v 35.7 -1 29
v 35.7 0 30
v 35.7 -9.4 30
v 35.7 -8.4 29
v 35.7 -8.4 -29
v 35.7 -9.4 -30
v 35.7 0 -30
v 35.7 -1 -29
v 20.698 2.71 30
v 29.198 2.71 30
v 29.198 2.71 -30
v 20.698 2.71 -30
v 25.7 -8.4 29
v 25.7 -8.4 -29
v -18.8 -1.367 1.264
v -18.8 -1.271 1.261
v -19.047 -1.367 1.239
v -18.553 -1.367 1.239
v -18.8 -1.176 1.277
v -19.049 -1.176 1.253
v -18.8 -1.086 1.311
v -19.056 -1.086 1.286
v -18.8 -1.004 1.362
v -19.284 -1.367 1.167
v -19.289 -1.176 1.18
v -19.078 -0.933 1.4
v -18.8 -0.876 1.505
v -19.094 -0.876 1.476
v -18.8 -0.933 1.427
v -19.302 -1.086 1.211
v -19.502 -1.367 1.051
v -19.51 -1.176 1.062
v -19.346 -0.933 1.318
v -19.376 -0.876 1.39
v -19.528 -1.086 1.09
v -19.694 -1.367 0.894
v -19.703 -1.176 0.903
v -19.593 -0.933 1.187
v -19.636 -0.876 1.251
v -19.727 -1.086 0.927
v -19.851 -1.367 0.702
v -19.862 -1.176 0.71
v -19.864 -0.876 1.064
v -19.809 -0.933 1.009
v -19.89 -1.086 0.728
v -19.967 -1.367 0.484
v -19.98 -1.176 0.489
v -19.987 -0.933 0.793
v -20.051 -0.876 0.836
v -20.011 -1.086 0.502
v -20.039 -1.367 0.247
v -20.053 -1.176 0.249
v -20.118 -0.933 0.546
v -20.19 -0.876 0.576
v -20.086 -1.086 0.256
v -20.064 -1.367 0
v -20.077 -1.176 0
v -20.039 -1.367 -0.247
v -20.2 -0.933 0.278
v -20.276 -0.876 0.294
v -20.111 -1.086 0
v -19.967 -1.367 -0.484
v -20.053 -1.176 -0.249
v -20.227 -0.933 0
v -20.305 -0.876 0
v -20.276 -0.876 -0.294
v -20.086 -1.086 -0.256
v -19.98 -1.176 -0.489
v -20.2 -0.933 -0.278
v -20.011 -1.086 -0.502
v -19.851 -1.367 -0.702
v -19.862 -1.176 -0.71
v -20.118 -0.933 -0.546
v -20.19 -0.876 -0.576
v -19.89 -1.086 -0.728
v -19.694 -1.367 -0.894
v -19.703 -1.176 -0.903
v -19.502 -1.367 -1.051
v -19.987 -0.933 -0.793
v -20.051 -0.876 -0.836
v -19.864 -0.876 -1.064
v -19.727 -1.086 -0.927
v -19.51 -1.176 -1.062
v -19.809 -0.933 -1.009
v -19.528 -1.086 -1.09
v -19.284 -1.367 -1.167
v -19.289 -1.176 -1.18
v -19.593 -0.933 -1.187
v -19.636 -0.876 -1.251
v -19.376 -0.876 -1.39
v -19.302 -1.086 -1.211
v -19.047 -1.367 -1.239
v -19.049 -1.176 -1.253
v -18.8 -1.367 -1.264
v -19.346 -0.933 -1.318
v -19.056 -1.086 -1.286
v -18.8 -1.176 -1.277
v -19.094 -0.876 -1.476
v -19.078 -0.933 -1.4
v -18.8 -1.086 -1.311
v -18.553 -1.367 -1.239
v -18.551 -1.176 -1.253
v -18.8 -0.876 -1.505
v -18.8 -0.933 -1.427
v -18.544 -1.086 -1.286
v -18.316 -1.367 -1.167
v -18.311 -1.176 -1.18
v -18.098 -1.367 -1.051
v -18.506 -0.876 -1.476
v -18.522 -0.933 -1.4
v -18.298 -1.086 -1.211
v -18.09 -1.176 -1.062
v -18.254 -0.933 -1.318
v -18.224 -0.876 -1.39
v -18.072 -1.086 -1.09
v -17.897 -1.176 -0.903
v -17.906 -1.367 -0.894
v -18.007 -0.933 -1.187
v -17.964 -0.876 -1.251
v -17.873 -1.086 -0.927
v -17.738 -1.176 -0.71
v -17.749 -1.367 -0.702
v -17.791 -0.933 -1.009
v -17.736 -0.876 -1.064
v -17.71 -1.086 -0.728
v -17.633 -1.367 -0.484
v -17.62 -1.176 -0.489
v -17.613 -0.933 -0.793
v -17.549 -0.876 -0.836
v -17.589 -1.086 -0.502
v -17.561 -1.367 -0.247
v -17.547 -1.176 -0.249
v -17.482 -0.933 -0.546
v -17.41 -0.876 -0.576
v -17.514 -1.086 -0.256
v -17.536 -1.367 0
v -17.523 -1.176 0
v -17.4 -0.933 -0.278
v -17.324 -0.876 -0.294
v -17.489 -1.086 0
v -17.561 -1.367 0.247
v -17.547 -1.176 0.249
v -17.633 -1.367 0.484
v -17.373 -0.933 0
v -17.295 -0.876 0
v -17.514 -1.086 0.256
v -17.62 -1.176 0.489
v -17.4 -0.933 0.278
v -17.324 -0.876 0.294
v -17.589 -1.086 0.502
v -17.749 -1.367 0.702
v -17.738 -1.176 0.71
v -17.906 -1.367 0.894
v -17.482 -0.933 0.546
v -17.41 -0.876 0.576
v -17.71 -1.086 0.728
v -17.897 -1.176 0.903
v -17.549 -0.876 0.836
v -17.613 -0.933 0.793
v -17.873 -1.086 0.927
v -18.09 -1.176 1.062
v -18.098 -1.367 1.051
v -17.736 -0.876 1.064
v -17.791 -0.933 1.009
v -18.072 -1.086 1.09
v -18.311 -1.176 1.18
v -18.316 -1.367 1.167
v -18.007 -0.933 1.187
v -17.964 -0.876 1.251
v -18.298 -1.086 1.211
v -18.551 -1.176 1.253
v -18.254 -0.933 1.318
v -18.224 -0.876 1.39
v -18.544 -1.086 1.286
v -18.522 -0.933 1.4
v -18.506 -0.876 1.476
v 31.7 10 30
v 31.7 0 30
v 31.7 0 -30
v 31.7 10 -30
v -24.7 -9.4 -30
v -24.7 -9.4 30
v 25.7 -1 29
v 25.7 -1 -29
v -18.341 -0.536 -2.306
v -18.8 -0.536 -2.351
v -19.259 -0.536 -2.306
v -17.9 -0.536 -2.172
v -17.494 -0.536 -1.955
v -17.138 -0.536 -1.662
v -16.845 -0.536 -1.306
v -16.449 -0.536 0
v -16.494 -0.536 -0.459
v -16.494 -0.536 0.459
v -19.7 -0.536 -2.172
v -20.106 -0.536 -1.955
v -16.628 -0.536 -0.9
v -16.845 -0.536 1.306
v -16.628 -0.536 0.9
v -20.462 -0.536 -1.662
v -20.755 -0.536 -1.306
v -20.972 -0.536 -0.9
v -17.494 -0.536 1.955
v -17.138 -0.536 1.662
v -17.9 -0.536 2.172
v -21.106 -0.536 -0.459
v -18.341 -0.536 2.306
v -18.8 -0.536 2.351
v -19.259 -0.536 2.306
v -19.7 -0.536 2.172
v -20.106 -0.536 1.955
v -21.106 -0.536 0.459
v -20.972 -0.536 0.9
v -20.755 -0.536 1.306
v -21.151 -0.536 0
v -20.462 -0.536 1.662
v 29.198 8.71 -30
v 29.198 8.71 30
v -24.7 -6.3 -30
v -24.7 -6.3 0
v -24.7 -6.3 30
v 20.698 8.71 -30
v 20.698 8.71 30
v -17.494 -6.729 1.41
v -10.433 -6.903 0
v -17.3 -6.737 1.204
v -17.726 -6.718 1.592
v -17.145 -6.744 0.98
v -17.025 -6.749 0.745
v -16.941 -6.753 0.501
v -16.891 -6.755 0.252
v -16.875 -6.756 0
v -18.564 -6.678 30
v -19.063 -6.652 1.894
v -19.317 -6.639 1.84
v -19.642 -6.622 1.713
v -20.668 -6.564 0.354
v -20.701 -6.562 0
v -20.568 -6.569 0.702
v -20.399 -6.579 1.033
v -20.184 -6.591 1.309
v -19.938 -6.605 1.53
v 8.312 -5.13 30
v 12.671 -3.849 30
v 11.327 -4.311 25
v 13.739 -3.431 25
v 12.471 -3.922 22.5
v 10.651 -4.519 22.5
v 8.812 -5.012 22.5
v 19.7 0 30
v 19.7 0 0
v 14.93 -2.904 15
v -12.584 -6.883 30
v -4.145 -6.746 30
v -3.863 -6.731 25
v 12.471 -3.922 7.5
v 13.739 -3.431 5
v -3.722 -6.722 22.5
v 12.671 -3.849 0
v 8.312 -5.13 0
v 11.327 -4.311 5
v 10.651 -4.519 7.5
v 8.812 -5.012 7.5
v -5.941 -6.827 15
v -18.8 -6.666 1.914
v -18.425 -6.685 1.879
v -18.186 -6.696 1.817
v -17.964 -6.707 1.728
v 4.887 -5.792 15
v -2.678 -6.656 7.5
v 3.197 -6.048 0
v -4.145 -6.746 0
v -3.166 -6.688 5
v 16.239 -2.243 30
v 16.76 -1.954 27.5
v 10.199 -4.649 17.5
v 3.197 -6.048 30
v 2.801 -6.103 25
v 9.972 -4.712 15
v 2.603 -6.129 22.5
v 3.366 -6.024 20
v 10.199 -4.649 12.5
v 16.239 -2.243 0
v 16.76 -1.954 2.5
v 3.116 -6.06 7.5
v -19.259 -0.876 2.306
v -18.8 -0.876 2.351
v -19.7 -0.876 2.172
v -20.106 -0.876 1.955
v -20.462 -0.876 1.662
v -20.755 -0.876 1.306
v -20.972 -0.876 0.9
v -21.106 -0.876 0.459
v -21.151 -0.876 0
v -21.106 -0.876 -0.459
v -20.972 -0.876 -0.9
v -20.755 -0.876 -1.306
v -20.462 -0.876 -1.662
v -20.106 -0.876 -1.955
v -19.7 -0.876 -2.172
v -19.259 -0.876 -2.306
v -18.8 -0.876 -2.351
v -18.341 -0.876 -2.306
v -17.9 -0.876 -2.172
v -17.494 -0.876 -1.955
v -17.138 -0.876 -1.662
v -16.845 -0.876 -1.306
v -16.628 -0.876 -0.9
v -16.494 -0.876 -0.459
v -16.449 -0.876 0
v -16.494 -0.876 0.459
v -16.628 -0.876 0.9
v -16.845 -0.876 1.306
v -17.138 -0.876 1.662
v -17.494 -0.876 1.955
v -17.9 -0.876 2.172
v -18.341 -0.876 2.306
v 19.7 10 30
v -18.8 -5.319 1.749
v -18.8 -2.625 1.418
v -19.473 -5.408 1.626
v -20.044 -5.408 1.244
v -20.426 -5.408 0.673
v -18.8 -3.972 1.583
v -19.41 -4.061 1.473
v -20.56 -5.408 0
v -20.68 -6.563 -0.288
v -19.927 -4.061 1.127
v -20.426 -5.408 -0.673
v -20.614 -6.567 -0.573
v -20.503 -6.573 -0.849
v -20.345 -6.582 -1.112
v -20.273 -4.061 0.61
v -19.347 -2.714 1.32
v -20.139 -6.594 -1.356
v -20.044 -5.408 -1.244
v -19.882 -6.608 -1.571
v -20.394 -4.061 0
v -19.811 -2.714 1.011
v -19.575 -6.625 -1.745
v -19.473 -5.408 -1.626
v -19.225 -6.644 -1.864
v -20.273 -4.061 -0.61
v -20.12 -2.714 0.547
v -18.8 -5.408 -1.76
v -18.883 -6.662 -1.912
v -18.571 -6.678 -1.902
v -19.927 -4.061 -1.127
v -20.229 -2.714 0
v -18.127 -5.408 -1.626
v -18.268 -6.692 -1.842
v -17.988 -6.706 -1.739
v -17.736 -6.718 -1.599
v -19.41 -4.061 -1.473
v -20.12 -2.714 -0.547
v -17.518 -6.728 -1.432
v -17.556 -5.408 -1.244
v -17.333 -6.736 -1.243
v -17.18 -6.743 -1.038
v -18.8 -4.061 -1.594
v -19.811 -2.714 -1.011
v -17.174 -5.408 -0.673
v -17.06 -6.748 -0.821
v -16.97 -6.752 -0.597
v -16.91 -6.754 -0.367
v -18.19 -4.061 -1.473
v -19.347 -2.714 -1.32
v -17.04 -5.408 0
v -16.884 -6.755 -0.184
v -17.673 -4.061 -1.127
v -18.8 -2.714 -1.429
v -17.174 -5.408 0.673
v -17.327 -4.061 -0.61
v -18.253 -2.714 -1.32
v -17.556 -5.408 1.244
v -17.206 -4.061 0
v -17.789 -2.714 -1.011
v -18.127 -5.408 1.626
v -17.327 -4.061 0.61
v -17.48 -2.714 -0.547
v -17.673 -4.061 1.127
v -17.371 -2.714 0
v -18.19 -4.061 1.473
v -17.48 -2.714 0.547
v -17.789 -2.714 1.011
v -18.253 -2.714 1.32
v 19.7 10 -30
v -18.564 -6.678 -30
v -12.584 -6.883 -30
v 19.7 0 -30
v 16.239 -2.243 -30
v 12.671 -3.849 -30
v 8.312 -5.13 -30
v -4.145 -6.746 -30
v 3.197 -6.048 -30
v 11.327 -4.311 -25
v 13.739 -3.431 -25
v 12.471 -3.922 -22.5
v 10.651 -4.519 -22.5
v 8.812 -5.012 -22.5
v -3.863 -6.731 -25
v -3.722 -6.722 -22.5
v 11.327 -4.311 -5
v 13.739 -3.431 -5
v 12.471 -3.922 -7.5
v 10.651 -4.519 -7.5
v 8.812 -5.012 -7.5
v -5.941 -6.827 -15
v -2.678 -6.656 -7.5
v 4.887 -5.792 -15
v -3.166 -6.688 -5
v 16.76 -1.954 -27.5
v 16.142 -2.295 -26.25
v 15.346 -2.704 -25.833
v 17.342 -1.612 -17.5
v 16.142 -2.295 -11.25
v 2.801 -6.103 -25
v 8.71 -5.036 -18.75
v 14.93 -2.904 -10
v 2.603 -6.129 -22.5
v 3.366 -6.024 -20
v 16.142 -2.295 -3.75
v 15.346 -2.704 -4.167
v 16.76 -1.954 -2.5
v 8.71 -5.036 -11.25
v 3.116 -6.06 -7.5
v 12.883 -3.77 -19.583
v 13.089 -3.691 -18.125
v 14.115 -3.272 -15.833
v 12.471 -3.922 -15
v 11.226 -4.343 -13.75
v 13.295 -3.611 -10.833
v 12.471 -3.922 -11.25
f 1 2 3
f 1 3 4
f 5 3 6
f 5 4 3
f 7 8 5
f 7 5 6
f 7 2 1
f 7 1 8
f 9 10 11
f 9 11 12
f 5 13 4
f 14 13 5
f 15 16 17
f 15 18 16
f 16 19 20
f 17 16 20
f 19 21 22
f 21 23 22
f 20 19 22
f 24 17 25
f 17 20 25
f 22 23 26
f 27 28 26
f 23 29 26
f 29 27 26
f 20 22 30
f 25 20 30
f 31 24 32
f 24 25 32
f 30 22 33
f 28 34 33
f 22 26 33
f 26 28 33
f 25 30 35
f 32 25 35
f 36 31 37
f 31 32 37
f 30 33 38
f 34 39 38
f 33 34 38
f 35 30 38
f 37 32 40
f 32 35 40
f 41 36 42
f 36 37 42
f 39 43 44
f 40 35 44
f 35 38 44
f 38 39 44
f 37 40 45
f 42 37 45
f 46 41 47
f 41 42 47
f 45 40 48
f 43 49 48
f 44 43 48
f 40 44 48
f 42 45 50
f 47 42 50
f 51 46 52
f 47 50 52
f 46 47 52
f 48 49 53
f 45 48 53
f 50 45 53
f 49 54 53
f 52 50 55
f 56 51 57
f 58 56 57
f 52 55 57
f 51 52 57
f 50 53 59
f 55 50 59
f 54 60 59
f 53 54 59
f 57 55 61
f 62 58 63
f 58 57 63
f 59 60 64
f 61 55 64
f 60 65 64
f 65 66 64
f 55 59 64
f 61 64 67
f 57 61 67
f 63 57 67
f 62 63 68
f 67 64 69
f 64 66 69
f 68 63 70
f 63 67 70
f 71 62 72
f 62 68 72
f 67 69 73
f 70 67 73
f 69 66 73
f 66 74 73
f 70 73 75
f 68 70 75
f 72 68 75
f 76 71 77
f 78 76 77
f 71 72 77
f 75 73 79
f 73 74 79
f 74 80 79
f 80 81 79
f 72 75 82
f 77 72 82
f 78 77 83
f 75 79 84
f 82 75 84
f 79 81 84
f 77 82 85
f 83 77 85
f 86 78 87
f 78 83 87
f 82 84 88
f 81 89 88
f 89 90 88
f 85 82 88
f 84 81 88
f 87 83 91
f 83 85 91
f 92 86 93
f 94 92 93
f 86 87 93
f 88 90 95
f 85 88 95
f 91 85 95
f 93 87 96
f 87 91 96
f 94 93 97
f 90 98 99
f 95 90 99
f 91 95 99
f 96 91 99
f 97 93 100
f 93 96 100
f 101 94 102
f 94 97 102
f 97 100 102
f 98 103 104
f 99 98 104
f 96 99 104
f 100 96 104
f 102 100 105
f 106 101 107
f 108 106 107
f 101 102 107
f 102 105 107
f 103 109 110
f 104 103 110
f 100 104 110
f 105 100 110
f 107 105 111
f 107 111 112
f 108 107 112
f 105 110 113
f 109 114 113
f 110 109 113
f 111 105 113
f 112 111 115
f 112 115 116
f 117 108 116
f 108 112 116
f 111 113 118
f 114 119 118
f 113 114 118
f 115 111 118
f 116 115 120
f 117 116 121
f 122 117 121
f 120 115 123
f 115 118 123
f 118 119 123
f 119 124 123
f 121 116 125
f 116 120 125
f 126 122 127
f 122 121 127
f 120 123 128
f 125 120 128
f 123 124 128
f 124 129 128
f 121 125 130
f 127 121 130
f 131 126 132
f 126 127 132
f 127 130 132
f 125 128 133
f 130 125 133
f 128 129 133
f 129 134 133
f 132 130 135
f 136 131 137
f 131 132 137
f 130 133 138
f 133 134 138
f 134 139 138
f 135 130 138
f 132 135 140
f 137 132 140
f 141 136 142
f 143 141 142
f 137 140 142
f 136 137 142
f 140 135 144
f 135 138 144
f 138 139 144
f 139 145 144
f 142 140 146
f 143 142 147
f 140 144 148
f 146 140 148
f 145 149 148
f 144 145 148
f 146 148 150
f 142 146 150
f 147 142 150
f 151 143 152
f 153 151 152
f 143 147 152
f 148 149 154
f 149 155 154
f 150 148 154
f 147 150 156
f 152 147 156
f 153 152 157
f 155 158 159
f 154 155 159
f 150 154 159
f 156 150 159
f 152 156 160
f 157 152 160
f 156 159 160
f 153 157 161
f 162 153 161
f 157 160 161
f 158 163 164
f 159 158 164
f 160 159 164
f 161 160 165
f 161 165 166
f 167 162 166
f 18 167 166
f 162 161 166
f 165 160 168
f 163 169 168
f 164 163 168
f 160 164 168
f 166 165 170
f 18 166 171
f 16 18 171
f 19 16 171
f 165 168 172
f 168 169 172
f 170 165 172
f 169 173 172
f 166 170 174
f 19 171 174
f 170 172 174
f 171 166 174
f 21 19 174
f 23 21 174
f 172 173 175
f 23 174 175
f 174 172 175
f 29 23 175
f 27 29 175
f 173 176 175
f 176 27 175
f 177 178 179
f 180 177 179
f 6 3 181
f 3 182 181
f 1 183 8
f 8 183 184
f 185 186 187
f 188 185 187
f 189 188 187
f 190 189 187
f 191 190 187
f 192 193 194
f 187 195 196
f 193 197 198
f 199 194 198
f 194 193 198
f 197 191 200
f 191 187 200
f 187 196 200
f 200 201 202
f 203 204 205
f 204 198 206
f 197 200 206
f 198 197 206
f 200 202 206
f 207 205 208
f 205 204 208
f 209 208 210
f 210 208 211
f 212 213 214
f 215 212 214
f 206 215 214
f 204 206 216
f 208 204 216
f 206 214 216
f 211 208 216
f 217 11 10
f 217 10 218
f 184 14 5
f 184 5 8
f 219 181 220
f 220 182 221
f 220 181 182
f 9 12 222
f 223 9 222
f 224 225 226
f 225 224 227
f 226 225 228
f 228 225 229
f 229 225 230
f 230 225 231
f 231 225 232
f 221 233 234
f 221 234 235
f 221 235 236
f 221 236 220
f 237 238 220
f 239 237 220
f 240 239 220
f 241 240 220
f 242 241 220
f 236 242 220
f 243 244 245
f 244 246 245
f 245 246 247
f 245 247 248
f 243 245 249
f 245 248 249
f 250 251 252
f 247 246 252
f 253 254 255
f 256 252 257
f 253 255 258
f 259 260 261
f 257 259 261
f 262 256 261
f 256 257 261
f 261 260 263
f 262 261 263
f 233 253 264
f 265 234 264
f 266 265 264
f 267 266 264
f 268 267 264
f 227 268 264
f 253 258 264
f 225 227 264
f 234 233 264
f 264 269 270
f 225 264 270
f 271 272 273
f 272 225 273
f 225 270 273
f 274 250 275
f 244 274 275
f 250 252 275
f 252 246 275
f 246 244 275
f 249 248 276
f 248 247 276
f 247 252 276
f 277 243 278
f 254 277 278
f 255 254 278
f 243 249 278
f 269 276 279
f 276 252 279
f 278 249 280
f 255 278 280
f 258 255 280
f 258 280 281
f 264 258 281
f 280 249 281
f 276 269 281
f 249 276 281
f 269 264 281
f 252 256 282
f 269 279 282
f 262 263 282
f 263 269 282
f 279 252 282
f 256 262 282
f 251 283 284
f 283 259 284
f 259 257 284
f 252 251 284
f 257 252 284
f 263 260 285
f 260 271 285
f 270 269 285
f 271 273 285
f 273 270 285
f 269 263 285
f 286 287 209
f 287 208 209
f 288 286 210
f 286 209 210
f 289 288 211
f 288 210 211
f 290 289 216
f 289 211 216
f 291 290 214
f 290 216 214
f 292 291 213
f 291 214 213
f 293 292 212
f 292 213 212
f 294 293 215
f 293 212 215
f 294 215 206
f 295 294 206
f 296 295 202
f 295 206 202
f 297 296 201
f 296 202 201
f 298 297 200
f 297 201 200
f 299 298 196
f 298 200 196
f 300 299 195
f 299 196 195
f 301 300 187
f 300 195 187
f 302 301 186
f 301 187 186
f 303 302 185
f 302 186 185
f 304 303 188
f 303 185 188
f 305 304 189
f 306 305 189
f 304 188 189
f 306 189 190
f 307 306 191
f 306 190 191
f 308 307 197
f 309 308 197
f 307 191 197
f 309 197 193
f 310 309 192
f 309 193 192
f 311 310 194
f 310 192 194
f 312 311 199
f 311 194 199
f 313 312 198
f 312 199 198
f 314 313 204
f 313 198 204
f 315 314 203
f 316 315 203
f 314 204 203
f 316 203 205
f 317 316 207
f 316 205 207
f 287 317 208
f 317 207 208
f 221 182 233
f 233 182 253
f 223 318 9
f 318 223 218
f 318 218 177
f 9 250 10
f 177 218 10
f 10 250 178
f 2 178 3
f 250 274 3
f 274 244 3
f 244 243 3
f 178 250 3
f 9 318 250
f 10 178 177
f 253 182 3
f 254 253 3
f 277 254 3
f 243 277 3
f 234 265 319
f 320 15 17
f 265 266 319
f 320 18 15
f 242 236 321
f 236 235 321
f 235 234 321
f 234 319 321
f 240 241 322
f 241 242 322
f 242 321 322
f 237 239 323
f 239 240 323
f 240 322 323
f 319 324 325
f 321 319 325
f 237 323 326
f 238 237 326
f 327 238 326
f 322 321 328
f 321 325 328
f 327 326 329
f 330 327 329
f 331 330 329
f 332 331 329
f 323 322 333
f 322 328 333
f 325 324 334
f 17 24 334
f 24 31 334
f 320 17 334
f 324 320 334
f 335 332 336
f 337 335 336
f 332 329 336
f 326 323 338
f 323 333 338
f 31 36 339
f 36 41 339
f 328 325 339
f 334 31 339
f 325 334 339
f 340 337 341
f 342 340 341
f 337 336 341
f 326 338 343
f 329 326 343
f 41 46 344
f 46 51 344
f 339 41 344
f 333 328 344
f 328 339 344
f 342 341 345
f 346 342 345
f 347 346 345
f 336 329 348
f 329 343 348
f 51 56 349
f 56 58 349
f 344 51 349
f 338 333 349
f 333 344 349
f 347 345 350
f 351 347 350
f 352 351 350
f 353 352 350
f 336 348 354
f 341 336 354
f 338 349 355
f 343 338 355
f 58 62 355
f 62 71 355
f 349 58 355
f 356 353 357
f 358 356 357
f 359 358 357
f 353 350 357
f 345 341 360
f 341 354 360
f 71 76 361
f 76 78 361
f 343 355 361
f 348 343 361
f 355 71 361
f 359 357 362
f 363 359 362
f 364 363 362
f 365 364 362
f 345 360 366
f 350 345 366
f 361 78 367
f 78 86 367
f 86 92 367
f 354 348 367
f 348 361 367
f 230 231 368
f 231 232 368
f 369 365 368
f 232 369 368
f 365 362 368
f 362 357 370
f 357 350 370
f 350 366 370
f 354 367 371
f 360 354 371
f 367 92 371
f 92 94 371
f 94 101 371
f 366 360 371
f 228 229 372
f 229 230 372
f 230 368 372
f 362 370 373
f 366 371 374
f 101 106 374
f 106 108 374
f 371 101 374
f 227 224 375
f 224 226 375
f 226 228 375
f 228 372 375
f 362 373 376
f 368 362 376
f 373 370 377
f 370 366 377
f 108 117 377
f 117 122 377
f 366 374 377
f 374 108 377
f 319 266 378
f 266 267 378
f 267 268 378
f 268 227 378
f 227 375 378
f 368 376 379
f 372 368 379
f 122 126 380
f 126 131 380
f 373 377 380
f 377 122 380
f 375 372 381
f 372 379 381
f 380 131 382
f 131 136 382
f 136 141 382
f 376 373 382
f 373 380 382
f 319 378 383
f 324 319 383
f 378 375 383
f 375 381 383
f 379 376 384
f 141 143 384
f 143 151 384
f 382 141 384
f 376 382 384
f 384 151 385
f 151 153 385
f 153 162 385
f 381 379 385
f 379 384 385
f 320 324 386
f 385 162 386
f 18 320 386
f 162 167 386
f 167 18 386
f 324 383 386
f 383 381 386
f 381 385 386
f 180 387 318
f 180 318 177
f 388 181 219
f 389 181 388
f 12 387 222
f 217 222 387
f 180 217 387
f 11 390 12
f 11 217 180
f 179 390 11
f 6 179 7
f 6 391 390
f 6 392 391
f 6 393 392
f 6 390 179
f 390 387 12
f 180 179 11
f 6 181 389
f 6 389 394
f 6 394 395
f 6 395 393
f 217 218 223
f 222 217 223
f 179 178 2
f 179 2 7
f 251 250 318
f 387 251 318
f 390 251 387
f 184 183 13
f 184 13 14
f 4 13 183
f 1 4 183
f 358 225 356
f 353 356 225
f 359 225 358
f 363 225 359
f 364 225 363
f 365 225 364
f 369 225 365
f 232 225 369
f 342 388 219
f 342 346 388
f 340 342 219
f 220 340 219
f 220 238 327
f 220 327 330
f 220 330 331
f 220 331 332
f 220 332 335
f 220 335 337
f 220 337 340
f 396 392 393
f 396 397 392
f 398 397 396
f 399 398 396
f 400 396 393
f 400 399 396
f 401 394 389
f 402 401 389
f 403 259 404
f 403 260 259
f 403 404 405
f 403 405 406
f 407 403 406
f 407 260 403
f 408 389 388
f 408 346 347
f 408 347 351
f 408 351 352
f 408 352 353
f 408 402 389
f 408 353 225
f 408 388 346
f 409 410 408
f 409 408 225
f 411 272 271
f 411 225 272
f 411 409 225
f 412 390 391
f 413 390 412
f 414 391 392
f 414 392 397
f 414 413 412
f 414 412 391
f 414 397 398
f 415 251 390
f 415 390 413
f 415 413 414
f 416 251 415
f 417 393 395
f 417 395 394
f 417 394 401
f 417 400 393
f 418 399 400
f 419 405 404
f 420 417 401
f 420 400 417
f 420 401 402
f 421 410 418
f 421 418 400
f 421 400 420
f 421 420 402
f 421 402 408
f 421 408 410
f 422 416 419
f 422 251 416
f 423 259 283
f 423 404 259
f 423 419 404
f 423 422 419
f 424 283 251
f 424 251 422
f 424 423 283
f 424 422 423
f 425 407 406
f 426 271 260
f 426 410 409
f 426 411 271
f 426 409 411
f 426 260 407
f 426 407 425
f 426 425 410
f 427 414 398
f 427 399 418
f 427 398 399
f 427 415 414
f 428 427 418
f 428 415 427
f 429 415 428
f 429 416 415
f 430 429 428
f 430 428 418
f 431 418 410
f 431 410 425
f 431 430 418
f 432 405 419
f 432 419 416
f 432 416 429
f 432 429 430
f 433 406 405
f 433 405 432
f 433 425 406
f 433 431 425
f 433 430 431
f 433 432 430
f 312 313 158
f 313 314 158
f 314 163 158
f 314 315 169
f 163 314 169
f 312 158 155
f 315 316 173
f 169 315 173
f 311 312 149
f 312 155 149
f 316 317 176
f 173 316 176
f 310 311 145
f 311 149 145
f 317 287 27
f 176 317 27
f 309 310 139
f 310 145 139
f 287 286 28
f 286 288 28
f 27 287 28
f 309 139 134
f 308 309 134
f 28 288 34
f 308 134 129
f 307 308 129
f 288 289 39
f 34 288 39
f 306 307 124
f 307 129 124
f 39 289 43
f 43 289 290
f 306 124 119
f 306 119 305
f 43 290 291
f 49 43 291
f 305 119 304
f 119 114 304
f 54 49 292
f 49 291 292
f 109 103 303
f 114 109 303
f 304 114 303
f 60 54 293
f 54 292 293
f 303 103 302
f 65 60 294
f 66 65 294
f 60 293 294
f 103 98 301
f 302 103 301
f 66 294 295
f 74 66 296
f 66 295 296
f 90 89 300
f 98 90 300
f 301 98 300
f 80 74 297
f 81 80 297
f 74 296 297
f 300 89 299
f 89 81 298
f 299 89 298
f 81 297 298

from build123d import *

# Parameters (mm, degrees)
SKETCH1_W           = 49.4
SKETCH1_H           = 140
BOSS_EXTRUDE1_DEPTH = 10
BOSS_EXTRUDE3_DEPTH = 30
SKETCH25_W          = 60
SKETCH25_H          = 9.4
BOSS_EXTRUDE4_DEPTH = 11
SHELL1_T            = -1
SKETCH34_W          = 12
SKETCH34_H          = 60
BOSS_EXTRUDE5_DEPTH = 10
SKETCH38_W          = 8.5
SKETCH38_H          = 6
CUT_EXTRUDE3_DEPTH  = 71.530064661


with BuildPart() as part:
    # Sketch1 → Boss-Extrude1 (new, symmetric)
    with BuildSketch(Plane(origin=(0, 0, 0), x_dir=(1, 0, 0), z_dir=(0, 1, 0))):
        Rectangle(SKETCH1_W, SKETCH1_H)
    extrude(amount=BOSS_EXTRUDE1_DEPTH, both=True)


with BuildPart() as body_2:
    # Sketch5 → Boss-Extrude3 (new, symmetric)
    with BuildSketch(Plane.XY):
        with BuildLine():
            Line((24.7, 0), (24.7, -9.4))
            Line((24.7, -9.4), (-24.7, -9.4))
            Line((-24.7, -9.4), (-24.7, -6.3))
            add(Edge.make_bspline(
                [(19.7, 0), (15.043437724, -3.574706607), (0.818334702, -7.477752328), (-14.226377906, -7.046455079), (-24.7, -6.3)],
                knots=[0, 0, 0, 0, 0.353407129, 1, 1, 1, 1], degree=3))
            Line((19.7, 0), (24.7, 0))
        make_face()
    extrude(amount=BOSS_EXTRUDE3_DEPTH, both=True)


with BuildPart() as part_1:
    add(part.part)

    # Combine1: intersect body 2
    add(body_2.part, mode=Mode.INTERSECT)

    # Sketch8 → Revolve2 (revolve)
    with BuildSketch(Plane.XY):
        with BuildLine():
            Line((-20.8, -7.364032413), (-20.06367715, -1.36716404))
            ThreePointArc((-20.06367715, -1.36716404), (-20.111122975, -1.085879422), (-20.30465694, -0.876316193))
            Line((-20.30465694, -0.876316193), (-21.150764231, -0.876316193))
            Line((-21.150764231, -0.876316193), (-21.150764231, -0.535859851))
            Line((-21.150764231, -0.535859851), (-18.8, -0.535859851))
            Line((-18.8, -0.535859851), (-18.8, -0.876316193))
            Line((-18.8, -0.876316193), (-18.8, -7.364032413))
            Line((-18.8, -7.364032413), (-20.8, -7.364032413))
        make_face()
    revolve(axis=Axis((-18.8, -0.876316193, 0), (0, -1, 0)))



with BuildPart() as body_2_2:
    # Sketch25 → Boss-Extrude4 (new body)
    with BuildSketch(Plane(origin=(24.7, 0, 0), x_dir=(0, 0, -1), z_dir=(1, 0, 0))):
        with Locations((0, -4.7)):
            Rectangle(SKETCH25_W, SKETCH25_H)
    extrude(amount=BOSS_EXTRUDE4_DEPTH)

    # Shell1
    shell1_openings = [body_2_2.faces().sort_by_distance(p)[0] for p in [
        (35.7, -4.7, 0),
    ]]
    offset(amount=SHELL1_T, openings=shell1_openings, kind=Kind.INTERSECTION)


with BuildPart() as part_2:
    add(part_1.part)

    add(body_2_2.part)  # Boss-Extrude5 merges body 2 2
    # Sketch34 → Boss-Extrude5 (add)
    with BuildSketch(Plane(origin=(0, 0, 0), x_dir=(1, 0, 0), z_dir=(0, 1, 0))):
        with Locations((25.7, 0)):
            Rectangle(SKETCH34_W, SKETCH34_H)
    extrude(amount=BOSS_EXTRUDE5_DEPTH)

    # Sketch38 → Cut-Extrude3 (cut, through all)
    with BuildSketch(Plane(origin=(0, 0, -30), x_dir=(-1, 0, 0), z_dir=(0, 0, -1))):
        with Locations((-24.948170483, 5.70970961)):
            Rectangle(SKETCH38_W, SKETCH38_H)
    extrude(amount=-CUT_EXTRUDE3_DEPTH, mode=Mode.SUBTRACT)


solid = part_2.part
